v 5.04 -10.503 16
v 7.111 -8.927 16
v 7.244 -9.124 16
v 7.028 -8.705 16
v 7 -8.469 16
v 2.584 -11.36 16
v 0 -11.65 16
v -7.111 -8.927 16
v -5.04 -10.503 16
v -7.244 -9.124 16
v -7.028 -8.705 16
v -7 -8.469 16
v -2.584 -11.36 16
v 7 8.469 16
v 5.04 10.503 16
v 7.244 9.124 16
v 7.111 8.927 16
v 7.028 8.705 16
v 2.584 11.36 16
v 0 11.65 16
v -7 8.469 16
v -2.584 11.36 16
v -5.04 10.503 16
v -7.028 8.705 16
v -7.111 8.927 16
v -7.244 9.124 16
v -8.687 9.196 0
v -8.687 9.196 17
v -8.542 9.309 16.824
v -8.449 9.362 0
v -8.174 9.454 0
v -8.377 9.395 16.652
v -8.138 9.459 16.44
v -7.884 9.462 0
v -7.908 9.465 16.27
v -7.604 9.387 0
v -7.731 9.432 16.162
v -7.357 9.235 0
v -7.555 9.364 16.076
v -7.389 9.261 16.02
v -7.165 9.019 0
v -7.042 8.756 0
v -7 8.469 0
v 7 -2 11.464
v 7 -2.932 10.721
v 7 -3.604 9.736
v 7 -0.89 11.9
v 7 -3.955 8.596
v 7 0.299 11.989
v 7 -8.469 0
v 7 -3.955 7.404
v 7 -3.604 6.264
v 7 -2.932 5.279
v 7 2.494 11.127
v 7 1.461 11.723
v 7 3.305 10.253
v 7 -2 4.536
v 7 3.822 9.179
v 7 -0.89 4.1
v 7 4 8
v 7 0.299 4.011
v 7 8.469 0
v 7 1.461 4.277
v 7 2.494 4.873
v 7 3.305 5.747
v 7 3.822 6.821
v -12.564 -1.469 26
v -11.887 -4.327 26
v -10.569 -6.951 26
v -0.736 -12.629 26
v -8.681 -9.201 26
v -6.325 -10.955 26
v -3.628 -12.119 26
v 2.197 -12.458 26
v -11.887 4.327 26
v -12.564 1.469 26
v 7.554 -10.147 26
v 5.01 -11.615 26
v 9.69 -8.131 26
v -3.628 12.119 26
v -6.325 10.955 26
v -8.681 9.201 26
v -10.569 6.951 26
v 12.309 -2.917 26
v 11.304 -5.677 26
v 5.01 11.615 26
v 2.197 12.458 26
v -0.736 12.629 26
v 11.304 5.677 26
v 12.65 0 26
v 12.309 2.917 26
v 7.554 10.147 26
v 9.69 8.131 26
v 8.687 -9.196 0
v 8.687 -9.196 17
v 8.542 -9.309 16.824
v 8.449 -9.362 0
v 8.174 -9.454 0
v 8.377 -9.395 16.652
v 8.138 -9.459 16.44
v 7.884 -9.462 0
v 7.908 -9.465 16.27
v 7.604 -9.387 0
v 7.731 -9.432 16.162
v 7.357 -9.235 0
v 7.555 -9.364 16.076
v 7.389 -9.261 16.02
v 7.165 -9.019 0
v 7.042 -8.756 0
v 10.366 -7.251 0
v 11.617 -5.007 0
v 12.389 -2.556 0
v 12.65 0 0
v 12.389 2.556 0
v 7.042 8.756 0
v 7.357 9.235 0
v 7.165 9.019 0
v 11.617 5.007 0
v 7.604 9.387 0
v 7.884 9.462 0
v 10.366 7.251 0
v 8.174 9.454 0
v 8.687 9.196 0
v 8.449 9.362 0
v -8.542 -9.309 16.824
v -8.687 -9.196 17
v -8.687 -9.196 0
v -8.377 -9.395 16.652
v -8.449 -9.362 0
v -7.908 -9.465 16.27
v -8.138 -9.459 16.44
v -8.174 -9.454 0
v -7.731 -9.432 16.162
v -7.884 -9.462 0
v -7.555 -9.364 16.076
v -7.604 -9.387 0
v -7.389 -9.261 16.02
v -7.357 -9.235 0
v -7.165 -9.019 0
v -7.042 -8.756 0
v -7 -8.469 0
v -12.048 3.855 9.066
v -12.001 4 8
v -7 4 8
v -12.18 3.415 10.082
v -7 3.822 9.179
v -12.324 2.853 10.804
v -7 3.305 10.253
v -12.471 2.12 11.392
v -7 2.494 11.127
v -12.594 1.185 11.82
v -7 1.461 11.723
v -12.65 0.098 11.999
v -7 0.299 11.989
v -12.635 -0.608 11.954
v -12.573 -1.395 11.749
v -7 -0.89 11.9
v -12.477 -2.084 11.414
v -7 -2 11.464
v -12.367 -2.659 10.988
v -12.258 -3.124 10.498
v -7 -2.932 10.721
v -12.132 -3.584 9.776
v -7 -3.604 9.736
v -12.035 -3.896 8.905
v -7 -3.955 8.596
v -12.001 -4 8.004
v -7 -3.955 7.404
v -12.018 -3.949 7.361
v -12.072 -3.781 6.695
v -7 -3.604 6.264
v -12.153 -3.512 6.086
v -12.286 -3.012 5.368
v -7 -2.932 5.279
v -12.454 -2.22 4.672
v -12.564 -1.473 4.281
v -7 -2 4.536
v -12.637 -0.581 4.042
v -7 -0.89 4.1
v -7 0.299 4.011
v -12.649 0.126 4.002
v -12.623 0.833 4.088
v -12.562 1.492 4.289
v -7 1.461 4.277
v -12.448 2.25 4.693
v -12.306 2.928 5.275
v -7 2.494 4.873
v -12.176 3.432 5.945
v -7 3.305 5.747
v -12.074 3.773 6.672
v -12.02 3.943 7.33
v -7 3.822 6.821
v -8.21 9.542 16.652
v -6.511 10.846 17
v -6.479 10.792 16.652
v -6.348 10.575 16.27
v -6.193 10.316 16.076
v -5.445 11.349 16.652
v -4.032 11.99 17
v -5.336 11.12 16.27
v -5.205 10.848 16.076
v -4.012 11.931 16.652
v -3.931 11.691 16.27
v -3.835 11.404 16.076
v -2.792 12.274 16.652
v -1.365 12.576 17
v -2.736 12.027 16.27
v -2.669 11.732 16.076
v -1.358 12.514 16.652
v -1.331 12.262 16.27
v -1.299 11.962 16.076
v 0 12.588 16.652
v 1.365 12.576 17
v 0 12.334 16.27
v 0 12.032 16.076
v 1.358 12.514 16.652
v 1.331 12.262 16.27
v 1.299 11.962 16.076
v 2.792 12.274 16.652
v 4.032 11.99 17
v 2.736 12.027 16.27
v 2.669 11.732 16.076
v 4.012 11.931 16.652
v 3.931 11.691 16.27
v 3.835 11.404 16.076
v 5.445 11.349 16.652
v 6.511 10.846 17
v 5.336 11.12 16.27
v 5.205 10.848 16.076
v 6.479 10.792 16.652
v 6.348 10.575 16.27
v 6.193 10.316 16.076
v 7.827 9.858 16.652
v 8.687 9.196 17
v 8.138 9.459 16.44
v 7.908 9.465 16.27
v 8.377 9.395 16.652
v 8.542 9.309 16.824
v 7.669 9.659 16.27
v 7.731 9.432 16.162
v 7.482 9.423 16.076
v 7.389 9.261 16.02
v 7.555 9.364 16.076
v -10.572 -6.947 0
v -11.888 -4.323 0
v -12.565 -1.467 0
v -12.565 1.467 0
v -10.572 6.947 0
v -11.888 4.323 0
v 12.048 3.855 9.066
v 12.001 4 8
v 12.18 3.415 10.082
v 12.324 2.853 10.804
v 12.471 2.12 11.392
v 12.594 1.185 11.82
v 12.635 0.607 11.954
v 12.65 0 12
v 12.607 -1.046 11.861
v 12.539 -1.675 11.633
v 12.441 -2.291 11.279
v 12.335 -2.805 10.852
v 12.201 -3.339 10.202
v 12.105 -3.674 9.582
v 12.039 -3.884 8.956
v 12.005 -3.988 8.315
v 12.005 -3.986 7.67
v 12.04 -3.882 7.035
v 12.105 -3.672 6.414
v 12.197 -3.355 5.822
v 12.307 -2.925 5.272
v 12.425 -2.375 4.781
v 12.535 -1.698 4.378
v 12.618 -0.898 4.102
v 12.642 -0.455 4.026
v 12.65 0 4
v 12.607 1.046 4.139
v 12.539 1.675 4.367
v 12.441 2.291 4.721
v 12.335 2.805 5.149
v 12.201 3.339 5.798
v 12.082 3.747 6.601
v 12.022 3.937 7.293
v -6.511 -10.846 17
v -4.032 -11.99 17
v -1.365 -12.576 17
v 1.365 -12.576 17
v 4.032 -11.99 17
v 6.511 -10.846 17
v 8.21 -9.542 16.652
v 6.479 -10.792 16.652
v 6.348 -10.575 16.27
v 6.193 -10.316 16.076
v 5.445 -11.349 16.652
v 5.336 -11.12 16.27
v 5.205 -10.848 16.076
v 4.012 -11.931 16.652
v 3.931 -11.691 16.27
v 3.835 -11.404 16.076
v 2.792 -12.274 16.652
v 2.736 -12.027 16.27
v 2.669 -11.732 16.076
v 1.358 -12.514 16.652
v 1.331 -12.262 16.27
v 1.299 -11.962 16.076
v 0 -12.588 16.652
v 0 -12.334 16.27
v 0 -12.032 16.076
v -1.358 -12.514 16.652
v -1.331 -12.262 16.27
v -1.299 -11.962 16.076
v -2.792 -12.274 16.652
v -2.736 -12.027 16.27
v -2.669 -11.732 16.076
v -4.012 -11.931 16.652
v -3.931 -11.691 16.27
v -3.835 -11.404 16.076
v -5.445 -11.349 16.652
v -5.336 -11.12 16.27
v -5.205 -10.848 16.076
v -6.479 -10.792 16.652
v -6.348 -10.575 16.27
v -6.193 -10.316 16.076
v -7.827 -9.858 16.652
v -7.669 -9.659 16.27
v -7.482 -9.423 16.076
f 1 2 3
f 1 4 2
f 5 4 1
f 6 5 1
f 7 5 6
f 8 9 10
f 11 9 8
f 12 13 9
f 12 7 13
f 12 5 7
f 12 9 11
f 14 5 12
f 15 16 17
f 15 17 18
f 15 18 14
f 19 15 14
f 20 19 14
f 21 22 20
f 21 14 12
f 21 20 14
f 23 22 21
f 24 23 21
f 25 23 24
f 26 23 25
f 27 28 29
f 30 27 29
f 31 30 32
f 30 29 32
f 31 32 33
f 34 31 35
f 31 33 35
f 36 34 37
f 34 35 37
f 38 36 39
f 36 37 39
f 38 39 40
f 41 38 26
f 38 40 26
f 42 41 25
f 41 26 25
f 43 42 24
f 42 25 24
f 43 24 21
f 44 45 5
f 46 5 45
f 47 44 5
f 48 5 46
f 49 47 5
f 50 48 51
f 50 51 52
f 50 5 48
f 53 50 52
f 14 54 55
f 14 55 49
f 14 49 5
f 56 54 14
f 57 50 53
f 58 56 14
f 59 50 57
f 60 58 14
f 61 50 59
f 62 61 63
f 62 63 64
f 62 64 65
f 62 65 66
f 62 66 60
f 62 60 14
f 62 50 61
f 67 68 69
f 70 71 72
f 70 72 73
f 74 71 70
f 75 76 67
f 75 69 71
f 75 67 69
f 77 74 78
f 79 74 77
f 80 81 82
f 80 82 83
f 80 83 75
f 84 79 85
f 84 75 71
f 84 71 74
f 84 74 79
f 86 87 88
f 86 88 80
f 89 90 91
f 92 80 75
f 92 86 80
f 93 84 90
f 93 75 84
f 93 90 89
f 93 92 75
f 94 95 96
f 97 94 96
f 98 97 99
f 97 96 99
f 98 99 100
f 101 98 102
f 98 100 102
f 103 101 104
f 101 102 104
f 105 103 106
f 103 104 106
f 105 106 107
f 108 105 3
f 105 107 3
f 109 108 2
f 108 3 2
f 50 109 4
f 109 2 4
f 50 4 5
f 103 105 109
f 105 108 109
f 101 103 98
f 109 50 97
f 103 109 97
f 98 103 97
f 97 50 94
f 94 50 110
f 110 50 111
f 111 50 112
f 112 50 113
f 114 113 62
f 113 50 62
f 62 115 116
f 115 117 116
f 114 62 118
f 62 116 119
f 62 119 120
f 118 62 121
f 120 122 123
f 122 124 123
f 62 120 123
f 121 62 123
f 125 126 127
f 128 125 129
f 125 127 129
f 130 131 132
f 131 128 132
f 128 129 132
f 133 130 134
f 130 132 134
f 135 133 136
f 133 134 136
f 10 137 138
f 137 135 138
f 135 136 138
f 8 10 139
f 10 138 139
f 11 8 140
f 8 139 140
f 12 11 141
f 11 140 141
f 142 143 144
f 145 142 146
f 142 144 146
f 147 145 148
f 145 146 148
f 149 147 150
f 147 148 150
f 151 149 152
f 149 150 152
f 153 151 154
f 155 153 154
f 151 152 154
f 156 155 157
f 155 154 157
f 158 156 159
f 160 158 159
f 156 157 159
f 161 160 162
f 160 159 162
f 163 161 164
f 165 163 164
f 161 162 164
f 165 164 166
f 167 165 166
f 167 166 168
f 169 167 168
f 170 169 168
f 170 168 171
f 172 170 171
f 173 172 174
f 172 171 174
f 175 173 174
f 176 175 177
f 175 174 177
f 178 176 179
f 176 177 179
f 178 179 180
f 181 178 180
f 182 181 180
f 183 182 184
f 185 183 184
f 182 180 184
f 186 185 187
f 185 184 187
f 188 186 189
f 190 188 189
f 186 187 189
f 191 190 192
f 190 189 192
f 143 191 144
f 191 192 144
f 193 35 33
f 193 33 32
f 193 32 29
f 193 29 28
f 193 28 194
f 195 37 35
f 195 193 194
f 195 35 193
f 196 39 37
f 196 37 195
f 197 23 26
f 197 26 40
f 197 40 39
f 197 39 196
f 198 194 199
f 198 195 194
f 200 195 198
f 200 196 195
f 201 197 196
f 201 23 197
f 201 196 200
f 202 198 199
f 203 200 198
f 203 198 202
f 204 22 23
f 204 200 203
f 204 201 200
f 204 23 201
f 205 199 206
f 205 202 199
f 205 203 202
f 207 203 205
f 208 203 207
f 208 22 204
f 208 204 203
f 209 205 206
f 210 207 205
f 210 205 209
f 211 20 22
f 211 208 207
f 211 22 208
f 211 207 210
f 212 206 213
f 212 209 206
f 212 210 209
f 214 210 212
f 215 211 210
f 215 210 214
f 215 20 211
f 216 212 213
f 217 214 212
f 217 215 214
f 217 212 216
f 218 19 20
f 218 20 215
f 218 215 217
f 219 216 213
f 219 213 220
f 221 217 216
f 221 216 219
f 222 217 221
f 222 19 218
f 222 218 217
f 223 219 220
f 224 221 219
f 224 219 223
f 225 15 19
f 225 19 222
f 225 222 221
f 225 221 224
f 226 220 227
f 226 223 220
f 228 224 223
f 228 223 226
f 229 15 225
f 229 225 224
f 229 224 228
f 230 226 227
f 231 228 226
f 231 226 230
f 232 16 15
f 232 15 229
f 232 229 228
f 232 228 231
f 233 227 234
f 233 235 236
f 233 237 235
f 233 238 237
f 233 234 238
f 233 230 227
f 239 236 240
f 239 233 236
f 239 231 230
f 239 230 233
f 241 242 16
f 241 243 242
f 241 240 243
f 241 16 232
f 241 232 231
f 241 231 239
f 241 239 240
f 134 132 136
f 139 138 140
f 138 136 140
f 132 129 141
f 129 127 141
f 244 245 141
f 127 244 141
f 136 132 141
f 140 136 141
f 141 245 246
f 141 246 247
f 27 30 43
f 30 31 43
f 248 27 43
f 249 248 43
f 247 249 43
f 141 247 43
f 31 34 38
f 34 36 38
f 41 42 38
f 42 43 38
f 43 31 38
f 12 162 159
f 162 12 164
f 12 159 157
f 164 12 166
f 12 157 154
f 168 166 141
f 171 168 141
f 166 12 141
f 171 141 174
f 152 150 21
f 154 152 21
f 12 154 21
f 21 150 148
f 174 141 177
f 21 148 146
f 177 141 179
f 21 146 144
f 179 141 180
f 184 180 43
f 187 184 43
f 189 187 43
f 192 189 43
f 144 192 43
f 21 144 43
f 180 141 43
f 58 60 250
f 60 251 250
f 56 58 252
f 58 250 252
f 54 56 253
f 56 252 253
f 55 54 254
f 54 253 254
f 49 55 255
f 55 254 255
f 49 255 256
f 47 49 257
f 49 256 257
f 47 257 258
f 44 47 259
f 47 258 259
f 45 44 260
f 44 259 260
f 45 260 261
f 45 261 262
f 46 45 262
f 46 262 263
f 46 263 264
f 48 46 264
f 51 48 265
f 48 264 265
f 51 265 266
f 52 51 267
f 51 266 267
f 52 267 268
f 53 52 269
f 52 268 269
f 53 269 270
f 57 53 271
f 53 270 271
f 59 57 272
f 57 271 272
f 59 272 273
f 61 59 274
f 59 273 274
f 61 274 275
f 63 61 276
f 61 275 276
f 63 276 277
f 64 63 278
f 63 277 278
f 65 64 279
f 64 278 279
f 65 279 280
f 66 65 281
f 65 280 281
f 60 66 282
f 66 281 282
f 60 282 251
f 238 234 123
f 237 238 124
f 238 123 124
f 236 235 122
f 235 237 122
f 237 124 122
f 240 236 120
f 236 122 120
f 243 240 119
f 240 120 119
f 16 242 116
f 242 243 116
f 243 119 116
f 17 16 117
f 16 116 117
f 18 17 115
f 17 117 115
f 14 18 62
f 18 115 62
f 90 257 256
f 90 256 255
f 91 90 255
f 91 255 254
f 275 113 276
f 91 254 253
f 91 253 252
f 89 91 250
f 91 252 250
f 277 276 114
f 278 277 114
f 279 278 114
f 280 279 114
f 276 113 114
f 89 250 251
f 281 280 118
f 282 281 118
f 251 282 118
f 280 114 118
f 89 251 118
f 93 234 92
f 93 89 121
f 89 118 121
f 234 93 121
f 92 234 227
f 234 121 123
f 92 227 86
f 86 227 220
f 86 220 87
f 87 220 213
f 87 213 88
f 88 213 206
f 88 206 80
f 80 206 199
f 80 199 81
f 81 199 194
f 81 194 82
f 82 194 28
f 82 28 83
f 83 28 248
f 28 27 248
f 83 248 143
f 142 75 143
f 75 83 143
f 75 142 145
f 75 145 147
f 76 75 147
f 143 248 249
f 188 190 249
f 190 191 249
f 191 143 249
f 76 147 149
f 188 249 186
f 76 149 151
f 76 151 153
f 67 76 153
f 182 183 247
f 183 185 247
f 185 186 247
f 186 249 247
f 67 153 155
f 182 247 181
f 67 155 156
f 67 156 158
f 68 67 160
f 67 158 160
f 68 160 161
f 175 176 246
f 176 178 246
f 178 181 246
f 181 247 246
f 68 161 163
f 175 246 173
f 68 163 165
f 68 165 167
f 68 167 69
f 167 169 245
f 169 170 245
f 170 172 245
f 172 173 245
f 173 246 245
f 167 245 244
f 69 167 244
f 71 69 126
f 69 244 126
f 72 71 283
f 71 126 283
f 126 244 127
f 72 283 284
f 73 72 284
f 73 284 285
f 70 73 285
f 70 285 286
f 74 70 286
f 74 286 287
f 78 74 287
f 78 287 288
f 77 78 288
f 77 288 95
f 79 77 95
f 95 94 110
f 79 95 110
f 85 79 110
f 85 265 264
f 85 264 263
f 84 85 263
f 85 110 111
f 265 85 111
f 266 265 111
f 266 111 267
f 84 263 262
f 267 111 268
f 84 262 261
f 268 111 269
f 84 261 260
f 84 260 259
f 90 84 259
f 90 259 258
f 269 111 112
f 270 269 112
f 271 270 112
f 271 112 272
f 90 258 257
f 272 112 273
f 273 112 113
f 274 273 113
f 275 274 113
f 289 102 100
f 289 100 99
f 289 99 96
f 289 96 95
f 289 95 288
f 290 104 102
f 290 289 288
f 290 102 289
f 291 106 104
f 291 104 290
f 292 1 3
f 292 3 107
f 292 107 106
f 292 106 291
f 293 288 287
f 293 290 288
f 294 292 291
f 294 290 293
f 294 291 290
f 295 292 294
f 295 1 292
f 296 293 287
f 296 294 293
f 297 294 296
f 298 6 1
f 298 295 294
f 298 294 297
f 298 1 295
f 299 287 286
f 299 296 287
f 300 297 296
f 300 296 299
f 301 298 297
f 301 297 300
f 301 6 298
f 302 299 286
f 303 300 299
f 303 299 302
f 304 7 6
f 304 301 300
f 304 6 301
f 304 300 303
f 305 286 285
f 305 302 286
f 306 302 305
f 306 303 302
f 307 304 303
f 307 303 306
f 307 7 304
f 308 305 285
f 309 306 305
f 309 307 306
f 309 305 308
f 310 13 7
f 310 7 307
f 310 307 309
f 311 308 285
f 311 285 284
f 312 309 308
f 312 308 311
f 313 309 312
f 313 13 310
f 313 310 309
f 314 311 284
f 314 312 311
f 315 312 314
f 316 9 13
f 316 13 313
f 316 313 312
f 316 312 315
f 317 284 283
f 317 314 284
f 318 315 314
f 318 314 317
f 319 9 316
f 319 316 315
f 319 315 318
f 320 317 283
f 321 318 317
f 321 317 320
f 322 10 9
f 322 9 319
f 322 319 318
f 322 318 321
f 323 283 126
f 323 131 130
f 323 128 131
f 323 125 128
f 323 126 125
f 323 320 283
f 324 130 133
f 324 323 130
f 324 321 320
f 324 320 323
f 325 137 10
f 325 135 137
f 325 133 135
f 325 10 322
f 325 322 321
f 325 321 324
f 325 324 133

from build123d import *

# Parameters (mm, degrees)
F0_R         = 12.65
F1_DEPTH     = 26
F2_W         = 14
F2_H         = 29.3698692877
F3_DEPTH     = 16
F4_T1_DEPTH  = 21.3868200642
F4_T6_ANGLE  = 89.8472397972
F4_T12_ANGLE = 89.8472397972
F4_T19_DEPTH = 26.7736401284
F4_T23_ANGLE = 89.8472397972
F4_T30_ANGLE = 89.8472397972
F4_T34_DEPTH = 26.7736401284
F4_T41_ANGLE = 89.8472397972
F4_T45_DEPTH = 26.7736401284
F4_T52_DEPTH = 26.7736401284
F4_T56_ANGLE = 89.8472397972
F5_R         = 4
F6_DEPTH     = 16.2


# Not quite as in the source:
# - a fillet or chamfer that OpenCascade refuses, or shapes differently, is made with other operations: its cross-section is extruded or revolved along the edge and cut away or added


with BuildPart() as f1:
    # F0 (on Top) → F1 (new body)
    with BuildSketch(Plane.XY):
        Circle(F0_R)
    extrude(amount=F1_DEPTH)

    # F2 (on Top) → F3 (cut)
    with BuildSketch(Plane.XY):
        Rectangle(F2_W, F2_H)
    extrude(amount=F3_DEPTH, mode=Mode.SUBTRACT)

    # F4: fillet of radius 1 on 6 edges, made by hand

    # F4_s2 → F4_t1 (cut)
    with BuildSketch(Plane.XY.offset(-5.3868200642)):
        with BuildLine():
            ThreePointArc((8.686695279, 9.1958591295), (7.6042066694, 9.3872533539), (7, 8.4689137438))
            Line((7, 8.4689137438), (7, 10.5367215015))
            ThreePointArc((7, 10.5367215015), (7.8719489435, 9.9022684185), (8.686695279, 9.1958591295))
        make_face()
        with BuildLine():
            ThreePointArc((8.686695279, -9.1958591295), (7.6042066694, -9.3872533539), (7, -8.4689137438))
            Line((7, -8.4689137438), (7, -10.5367215015))
            ThreePointArc((7, -10.5367215015), (7.8719489435, -9.9022684185), (8.686695279, -9.1958591295))
        make_face()
        with BuildLine():
            ThreePointArc((-8.686695279, 9.1958591295), (-7.6042066694, 9.3872533539), (-7, 8.4689137438))
            Line((-7, 8.4689137438), (-7, 10.5367215015))
            ThreePointArc((-7, 10.5367215015), (-7.8719489435, 9.9022684185), (-8.686695279, 9.1958591295))
        make_face()
        with BuildLine():
            ThreePointArc((-8.686695279, -9.1958591295), (-7.6042066694, -9.3872533539), (-7, -8.4689137438))
            Line((-7, -8.4689137438), (-7, -10.5367215015))
            ThreePointArc((-7, -10.5367215015), (-7.8719489435, -9.9022684185), (-8.686695279, -9.1958591295))
        make_face()
    extrude(amount=F4_T1_DEPTH, mode=Mode.SUBTRACT)


with BuildPart() as f4_tool4:
    # F4_s5 → F4_t6 (revolve)
    with BuildSketch(Plane(origin=(0, 0, 0), x_dir=(0, 0, 1), z_dir=(-0.7080487855, -0.7061635202, 0))):
        with BuildLine():
            ThreePointArc((17, 12.65), (16.2928932188, 12.3571067812), (16, 11.65))
            Line((16, 11.65), (16, 12.65))
            Line((16, 12.65), (17, 12.65))
        make_face()
    revolve(axis=Axis((0, 0, 16), (0, 0, -1)), revolution_arc=F4_T6_ANGLE)

    split(bisect_by=Plane.YZ.offset(7), keep=Keep.BOTTOM)

    split(bisect_by=Plane.YZ.offset(-7), keep=Keep.TOP)


with BuildPart() as f1_1:
    add(f1.part)

    # F4_t3: cut F4_tool4
    add(f4_tool4.part, mode=Mode.SUBTRACT)


with BuildPart() as f4_tool10:
    # F4_s11 → F4_t12 (revolve)
    with BuildSketch(Plane(origin=(0, 0, 0), x_dir=(0, 0, 1), z_dir=(0.7080487855, 0.7061635202, 0))):
        with BuildLine():
            ThreePointArc((17, 12.65), (16.2928932188, 12.3571067812), (16, 11.65))
            Line((16, 11.65), (16, 12.65))
            Line((16, 12.65), (17, 12.65))
        make_face()
    revolve(axis=Axis((0, 0, 16), (0, 0, -1)), revolution_arc=F4_T12_ANGLE)

    split(bisect_by=Plane.YZ.offset(7), keep=Keep.BOTTOM)

    split(bisect_by=Plane.YZ.offset(-7), keep=Keep.TOP)


with BuildPart() as f1_2:
    add(f1_1.part)

    # F4_t9: cut F4_tool10
    add(f4_tool10.part, mode=Mode.SUBTRACT)


with BuildPart() as f4_tool17:
    # F4_s18 → F4_t19 (new body)
    with BuildSketch(Plane.XY.offset(21.3868200642)):
        with BuildLine():
            ThreePointArc((8.686695279, 9.1958591295), (7.6042066694, 9.3872533539), (7, 8.4689137438))
            Line((7, 8.4689137438), (7, 10.5367215015))
            ThreePointArc((7, 10.5367215015), (7.8719489435, 9.9022684185), (8.686695279, 9.1958591295))
        make_face()
    extrude(amount=-F4_T19_DEPTH)

    split(bisect_by=Plane.XY.offset(16), keep=Keep.TOP)


with BuildPart() as f4_tool21:
    # F4_s22 → F4_t23 (revolve)
    with BuildSketch(Plane(origin=(0, 0, 0), x_dir=(0, 0, 1), z_dir=(-0.7080487855, -0.7061635202, 0))):
        with BuildLine():
            ThreePointArc((17, 12.65), (16.2928932188, 12.3571067812), (16, 11.65))
            Line((16, 11.65), (16, 12.65))
            Line((16, 12.65), (17, 12.65))
        make_face()
    revolve(axis=Axis((0, 0, 16), (0, 0, -1)), revolution_arc=F4_T23_ANGLE)

    split(bisect_by=Plane.YZ.offset(7), keep=Keep.TOP)


with BuildPart() as f4_tool17_1:
    add(f4_tool17.part)

    # F4_t25: intersect F4_tool21
    add(f4_tool21.part, mode=Mode.INTERSECT)


with BuildPart() as f1_3:
    add(f1_2.part)

    # F4_t15: cut F4_tool17
    add(f4_tool17_1.part, mode=Mode.SUBTRACT)


with BuildPart() as f4_tool28:
    # F4_s29 → F4_t30 (revolve)
    with BuildSketch(Plane(origin=(0, 0, 0), x_dir=(0, 0, 1), z_dir=(0.7080487855, 0.7061635202, 0))):
        with BuildLine():
            ThreePointArc((17, 12.65), (16.2928932188, 12.3571067812), (16, 11.65))
            Line((16, 11.65), (16, 12.65))
            Line((16, 12.65), (17, 12.65))
        make_face()
    revolve(axis=Axis((0, 0, 16), (0, 0, -1)), revolution_arc=F4_T30_ANGLE)

    split(bisect_by=Plane.YZ.offset(7), keep=Keep.TOP)


with BuildPart() as f4_tool32:
    # F4_s33 → F4_t34 (new body)
    with BuildSketch(Plane.XY.offset(21.3868200642)):
        with BuildLine():
            ThreePointArc((8.686695279, -9.1958591295), (7.6042066694, -9.3872533539), (7, -8.4689137438))
            Line((7, -8.4689137438), (7, -10.5367215015))
            ThreePointArc((7, -10.5367215015), (7.8719489435, -9.9022684185), (8.686695279, -9.1958591295))
        make_face()
    extrude(amount=-F4_T34_DEPTH)

    split(bisect_by=Plane.XY.offset(16), keep=Keep.TOP)


with BuildPart() as f4_tool28_1:
    add(f4_tool28.part)

    # F4_t36: intersect F4_tool32
    add(f4_tool32.part, mode=Mode.INTERSECT)


with BuildPart() as f1_4:
    add(f1_3.part)

    # F4_t26: cut F4_tool28
    add(f4_tool28_1.part, mode=Mode.SUBTRACT)


with BuildPart() as f4_tool39:
    # F4_s40 → F4_t41 (revolve)
    with BuildSketch(Plane(origin=(0, 0, 0), x_dir=(0, 0, 1), z_dir=(-0.7080487855, -0.7061635202, 0))):
        with BuildLine():
            ThreePointArc((17, 12.65), (16.2928932188, 12.3571067812), (16, 11.65))
            Line((16, 11.65), (16, 12.65))
            Line((16, 12.65), (17, 12.65))
        make_face()
    revolve(axis=Axis((0, 0, 16), (0, 0, -1)), revolution_arc=F4_T41_ANGLE)

    split(bisect_by=Plane.YZ.offset(-7), keep=Keep.BOTTOM)


with BuildPart() as f4_tool43:
    # F4_s44 → F4_t45 (new body)
    with BuildSketch(Plane.XY.offset(21.3868200642)):
        with BuildLine():
            ThreePointArc((-8.686695279, 9.1958591295), (-7.6042066694, 9.3872533539), (-7, 8.4689137438))
            Line((-7, 8.4689137438), (-7, 10.5367215015))
            ThreePointArc((-7, 10.5367215015), (-7.8719489435, 9.9022684185), (-8.686695279, 9.1958591295))
        make_face()
    extrude(amount=-F4_T45_DEPTH)

    split(bisect_by=Plane.XY.offset(16), keep=Keep.TOP)


with BuildPart() as f4_tool39_1:
    add(f4_tool39.part)

    # F4_t47: intersect F4_tool43
    add(f4_tool43.part, mode=Mode.INTERSECT)


with BuildPart() as f1_5:
    add(f1_4.part)

    # F4_t37: cut F4_tool39
    add(f4_tool39_1.part, mode=Mode.SUBTRACT)


with BuildPart() as f4_tool50:
    # F4_s51 → F4_t52 (new body)
    with BuildSketch(Plane.XY.offset(21.3868200642)):
        with BuildLine():
            ThreePointArc((-8.686695279, -9.1958591295), (-7.6042066694, -9.3872533539), (-7, -8.4689137438))
            Line((-7, -8.4689137438), (-7, -10.5367215015))
            ThreePointArc((-7, -10.5367215015), (-7.8719489435, -9.9022684185), (-8.686695279, -9.1958591295))
        make_face()
    extrude(amount=-F4_T52_DEPTH)

    split(bisect_by=Plane.XY.offset(16), keep=Keep.TOP)


with BuildPart() as f4_tool54:
    # F4_s55 → F4_t56 (revolve)
    with BuildSketch(Plane(origin=(0, 0, 0), x_dir=(0, 0, 1), z_dir=(0.7080487855, 0.7061635202, 0))):
        with BuildLine():
            ThreePointArc((17, 12.65), (16.2928932188, 12.3571067812), (16, 11.65))
            Line((16, 11.65), (16, 12.65))
            Line((16, 12.65), (17, 12.65))
        make_face()
    revolve(axis=Axis((0, 0, 16), (0, 0, -1)), revolution_arc=F4_T56_ANGLE)

    split(bisect_by=Plane.YZ.offset(-7), keep=Keep.BOTTOM)


with BuildPart() as f4_tool50_1:
    add(f4_tool50.part)

    # F4_t58: intersect F4_tool54
    add(f4_tool54.part, mode=Mode.INTERSECT)


with BuildPart() as f1_6:
    add(f1_5.part)

    # F4_t48: cut F4_tool50
    add(f4_tool50_1.part, mode=Mode.SUBTRACT)

    # F5 (on Right) → F6 (cut, symmetric)
    with BuildSketch(Plane.YZ):
        with Locations((0, 8)):
            Circle(F5_R)
    extrude(amount=F6_DEPTH, both=True, mode=Mode.SUBTRACT)


solid = f1_6.part
